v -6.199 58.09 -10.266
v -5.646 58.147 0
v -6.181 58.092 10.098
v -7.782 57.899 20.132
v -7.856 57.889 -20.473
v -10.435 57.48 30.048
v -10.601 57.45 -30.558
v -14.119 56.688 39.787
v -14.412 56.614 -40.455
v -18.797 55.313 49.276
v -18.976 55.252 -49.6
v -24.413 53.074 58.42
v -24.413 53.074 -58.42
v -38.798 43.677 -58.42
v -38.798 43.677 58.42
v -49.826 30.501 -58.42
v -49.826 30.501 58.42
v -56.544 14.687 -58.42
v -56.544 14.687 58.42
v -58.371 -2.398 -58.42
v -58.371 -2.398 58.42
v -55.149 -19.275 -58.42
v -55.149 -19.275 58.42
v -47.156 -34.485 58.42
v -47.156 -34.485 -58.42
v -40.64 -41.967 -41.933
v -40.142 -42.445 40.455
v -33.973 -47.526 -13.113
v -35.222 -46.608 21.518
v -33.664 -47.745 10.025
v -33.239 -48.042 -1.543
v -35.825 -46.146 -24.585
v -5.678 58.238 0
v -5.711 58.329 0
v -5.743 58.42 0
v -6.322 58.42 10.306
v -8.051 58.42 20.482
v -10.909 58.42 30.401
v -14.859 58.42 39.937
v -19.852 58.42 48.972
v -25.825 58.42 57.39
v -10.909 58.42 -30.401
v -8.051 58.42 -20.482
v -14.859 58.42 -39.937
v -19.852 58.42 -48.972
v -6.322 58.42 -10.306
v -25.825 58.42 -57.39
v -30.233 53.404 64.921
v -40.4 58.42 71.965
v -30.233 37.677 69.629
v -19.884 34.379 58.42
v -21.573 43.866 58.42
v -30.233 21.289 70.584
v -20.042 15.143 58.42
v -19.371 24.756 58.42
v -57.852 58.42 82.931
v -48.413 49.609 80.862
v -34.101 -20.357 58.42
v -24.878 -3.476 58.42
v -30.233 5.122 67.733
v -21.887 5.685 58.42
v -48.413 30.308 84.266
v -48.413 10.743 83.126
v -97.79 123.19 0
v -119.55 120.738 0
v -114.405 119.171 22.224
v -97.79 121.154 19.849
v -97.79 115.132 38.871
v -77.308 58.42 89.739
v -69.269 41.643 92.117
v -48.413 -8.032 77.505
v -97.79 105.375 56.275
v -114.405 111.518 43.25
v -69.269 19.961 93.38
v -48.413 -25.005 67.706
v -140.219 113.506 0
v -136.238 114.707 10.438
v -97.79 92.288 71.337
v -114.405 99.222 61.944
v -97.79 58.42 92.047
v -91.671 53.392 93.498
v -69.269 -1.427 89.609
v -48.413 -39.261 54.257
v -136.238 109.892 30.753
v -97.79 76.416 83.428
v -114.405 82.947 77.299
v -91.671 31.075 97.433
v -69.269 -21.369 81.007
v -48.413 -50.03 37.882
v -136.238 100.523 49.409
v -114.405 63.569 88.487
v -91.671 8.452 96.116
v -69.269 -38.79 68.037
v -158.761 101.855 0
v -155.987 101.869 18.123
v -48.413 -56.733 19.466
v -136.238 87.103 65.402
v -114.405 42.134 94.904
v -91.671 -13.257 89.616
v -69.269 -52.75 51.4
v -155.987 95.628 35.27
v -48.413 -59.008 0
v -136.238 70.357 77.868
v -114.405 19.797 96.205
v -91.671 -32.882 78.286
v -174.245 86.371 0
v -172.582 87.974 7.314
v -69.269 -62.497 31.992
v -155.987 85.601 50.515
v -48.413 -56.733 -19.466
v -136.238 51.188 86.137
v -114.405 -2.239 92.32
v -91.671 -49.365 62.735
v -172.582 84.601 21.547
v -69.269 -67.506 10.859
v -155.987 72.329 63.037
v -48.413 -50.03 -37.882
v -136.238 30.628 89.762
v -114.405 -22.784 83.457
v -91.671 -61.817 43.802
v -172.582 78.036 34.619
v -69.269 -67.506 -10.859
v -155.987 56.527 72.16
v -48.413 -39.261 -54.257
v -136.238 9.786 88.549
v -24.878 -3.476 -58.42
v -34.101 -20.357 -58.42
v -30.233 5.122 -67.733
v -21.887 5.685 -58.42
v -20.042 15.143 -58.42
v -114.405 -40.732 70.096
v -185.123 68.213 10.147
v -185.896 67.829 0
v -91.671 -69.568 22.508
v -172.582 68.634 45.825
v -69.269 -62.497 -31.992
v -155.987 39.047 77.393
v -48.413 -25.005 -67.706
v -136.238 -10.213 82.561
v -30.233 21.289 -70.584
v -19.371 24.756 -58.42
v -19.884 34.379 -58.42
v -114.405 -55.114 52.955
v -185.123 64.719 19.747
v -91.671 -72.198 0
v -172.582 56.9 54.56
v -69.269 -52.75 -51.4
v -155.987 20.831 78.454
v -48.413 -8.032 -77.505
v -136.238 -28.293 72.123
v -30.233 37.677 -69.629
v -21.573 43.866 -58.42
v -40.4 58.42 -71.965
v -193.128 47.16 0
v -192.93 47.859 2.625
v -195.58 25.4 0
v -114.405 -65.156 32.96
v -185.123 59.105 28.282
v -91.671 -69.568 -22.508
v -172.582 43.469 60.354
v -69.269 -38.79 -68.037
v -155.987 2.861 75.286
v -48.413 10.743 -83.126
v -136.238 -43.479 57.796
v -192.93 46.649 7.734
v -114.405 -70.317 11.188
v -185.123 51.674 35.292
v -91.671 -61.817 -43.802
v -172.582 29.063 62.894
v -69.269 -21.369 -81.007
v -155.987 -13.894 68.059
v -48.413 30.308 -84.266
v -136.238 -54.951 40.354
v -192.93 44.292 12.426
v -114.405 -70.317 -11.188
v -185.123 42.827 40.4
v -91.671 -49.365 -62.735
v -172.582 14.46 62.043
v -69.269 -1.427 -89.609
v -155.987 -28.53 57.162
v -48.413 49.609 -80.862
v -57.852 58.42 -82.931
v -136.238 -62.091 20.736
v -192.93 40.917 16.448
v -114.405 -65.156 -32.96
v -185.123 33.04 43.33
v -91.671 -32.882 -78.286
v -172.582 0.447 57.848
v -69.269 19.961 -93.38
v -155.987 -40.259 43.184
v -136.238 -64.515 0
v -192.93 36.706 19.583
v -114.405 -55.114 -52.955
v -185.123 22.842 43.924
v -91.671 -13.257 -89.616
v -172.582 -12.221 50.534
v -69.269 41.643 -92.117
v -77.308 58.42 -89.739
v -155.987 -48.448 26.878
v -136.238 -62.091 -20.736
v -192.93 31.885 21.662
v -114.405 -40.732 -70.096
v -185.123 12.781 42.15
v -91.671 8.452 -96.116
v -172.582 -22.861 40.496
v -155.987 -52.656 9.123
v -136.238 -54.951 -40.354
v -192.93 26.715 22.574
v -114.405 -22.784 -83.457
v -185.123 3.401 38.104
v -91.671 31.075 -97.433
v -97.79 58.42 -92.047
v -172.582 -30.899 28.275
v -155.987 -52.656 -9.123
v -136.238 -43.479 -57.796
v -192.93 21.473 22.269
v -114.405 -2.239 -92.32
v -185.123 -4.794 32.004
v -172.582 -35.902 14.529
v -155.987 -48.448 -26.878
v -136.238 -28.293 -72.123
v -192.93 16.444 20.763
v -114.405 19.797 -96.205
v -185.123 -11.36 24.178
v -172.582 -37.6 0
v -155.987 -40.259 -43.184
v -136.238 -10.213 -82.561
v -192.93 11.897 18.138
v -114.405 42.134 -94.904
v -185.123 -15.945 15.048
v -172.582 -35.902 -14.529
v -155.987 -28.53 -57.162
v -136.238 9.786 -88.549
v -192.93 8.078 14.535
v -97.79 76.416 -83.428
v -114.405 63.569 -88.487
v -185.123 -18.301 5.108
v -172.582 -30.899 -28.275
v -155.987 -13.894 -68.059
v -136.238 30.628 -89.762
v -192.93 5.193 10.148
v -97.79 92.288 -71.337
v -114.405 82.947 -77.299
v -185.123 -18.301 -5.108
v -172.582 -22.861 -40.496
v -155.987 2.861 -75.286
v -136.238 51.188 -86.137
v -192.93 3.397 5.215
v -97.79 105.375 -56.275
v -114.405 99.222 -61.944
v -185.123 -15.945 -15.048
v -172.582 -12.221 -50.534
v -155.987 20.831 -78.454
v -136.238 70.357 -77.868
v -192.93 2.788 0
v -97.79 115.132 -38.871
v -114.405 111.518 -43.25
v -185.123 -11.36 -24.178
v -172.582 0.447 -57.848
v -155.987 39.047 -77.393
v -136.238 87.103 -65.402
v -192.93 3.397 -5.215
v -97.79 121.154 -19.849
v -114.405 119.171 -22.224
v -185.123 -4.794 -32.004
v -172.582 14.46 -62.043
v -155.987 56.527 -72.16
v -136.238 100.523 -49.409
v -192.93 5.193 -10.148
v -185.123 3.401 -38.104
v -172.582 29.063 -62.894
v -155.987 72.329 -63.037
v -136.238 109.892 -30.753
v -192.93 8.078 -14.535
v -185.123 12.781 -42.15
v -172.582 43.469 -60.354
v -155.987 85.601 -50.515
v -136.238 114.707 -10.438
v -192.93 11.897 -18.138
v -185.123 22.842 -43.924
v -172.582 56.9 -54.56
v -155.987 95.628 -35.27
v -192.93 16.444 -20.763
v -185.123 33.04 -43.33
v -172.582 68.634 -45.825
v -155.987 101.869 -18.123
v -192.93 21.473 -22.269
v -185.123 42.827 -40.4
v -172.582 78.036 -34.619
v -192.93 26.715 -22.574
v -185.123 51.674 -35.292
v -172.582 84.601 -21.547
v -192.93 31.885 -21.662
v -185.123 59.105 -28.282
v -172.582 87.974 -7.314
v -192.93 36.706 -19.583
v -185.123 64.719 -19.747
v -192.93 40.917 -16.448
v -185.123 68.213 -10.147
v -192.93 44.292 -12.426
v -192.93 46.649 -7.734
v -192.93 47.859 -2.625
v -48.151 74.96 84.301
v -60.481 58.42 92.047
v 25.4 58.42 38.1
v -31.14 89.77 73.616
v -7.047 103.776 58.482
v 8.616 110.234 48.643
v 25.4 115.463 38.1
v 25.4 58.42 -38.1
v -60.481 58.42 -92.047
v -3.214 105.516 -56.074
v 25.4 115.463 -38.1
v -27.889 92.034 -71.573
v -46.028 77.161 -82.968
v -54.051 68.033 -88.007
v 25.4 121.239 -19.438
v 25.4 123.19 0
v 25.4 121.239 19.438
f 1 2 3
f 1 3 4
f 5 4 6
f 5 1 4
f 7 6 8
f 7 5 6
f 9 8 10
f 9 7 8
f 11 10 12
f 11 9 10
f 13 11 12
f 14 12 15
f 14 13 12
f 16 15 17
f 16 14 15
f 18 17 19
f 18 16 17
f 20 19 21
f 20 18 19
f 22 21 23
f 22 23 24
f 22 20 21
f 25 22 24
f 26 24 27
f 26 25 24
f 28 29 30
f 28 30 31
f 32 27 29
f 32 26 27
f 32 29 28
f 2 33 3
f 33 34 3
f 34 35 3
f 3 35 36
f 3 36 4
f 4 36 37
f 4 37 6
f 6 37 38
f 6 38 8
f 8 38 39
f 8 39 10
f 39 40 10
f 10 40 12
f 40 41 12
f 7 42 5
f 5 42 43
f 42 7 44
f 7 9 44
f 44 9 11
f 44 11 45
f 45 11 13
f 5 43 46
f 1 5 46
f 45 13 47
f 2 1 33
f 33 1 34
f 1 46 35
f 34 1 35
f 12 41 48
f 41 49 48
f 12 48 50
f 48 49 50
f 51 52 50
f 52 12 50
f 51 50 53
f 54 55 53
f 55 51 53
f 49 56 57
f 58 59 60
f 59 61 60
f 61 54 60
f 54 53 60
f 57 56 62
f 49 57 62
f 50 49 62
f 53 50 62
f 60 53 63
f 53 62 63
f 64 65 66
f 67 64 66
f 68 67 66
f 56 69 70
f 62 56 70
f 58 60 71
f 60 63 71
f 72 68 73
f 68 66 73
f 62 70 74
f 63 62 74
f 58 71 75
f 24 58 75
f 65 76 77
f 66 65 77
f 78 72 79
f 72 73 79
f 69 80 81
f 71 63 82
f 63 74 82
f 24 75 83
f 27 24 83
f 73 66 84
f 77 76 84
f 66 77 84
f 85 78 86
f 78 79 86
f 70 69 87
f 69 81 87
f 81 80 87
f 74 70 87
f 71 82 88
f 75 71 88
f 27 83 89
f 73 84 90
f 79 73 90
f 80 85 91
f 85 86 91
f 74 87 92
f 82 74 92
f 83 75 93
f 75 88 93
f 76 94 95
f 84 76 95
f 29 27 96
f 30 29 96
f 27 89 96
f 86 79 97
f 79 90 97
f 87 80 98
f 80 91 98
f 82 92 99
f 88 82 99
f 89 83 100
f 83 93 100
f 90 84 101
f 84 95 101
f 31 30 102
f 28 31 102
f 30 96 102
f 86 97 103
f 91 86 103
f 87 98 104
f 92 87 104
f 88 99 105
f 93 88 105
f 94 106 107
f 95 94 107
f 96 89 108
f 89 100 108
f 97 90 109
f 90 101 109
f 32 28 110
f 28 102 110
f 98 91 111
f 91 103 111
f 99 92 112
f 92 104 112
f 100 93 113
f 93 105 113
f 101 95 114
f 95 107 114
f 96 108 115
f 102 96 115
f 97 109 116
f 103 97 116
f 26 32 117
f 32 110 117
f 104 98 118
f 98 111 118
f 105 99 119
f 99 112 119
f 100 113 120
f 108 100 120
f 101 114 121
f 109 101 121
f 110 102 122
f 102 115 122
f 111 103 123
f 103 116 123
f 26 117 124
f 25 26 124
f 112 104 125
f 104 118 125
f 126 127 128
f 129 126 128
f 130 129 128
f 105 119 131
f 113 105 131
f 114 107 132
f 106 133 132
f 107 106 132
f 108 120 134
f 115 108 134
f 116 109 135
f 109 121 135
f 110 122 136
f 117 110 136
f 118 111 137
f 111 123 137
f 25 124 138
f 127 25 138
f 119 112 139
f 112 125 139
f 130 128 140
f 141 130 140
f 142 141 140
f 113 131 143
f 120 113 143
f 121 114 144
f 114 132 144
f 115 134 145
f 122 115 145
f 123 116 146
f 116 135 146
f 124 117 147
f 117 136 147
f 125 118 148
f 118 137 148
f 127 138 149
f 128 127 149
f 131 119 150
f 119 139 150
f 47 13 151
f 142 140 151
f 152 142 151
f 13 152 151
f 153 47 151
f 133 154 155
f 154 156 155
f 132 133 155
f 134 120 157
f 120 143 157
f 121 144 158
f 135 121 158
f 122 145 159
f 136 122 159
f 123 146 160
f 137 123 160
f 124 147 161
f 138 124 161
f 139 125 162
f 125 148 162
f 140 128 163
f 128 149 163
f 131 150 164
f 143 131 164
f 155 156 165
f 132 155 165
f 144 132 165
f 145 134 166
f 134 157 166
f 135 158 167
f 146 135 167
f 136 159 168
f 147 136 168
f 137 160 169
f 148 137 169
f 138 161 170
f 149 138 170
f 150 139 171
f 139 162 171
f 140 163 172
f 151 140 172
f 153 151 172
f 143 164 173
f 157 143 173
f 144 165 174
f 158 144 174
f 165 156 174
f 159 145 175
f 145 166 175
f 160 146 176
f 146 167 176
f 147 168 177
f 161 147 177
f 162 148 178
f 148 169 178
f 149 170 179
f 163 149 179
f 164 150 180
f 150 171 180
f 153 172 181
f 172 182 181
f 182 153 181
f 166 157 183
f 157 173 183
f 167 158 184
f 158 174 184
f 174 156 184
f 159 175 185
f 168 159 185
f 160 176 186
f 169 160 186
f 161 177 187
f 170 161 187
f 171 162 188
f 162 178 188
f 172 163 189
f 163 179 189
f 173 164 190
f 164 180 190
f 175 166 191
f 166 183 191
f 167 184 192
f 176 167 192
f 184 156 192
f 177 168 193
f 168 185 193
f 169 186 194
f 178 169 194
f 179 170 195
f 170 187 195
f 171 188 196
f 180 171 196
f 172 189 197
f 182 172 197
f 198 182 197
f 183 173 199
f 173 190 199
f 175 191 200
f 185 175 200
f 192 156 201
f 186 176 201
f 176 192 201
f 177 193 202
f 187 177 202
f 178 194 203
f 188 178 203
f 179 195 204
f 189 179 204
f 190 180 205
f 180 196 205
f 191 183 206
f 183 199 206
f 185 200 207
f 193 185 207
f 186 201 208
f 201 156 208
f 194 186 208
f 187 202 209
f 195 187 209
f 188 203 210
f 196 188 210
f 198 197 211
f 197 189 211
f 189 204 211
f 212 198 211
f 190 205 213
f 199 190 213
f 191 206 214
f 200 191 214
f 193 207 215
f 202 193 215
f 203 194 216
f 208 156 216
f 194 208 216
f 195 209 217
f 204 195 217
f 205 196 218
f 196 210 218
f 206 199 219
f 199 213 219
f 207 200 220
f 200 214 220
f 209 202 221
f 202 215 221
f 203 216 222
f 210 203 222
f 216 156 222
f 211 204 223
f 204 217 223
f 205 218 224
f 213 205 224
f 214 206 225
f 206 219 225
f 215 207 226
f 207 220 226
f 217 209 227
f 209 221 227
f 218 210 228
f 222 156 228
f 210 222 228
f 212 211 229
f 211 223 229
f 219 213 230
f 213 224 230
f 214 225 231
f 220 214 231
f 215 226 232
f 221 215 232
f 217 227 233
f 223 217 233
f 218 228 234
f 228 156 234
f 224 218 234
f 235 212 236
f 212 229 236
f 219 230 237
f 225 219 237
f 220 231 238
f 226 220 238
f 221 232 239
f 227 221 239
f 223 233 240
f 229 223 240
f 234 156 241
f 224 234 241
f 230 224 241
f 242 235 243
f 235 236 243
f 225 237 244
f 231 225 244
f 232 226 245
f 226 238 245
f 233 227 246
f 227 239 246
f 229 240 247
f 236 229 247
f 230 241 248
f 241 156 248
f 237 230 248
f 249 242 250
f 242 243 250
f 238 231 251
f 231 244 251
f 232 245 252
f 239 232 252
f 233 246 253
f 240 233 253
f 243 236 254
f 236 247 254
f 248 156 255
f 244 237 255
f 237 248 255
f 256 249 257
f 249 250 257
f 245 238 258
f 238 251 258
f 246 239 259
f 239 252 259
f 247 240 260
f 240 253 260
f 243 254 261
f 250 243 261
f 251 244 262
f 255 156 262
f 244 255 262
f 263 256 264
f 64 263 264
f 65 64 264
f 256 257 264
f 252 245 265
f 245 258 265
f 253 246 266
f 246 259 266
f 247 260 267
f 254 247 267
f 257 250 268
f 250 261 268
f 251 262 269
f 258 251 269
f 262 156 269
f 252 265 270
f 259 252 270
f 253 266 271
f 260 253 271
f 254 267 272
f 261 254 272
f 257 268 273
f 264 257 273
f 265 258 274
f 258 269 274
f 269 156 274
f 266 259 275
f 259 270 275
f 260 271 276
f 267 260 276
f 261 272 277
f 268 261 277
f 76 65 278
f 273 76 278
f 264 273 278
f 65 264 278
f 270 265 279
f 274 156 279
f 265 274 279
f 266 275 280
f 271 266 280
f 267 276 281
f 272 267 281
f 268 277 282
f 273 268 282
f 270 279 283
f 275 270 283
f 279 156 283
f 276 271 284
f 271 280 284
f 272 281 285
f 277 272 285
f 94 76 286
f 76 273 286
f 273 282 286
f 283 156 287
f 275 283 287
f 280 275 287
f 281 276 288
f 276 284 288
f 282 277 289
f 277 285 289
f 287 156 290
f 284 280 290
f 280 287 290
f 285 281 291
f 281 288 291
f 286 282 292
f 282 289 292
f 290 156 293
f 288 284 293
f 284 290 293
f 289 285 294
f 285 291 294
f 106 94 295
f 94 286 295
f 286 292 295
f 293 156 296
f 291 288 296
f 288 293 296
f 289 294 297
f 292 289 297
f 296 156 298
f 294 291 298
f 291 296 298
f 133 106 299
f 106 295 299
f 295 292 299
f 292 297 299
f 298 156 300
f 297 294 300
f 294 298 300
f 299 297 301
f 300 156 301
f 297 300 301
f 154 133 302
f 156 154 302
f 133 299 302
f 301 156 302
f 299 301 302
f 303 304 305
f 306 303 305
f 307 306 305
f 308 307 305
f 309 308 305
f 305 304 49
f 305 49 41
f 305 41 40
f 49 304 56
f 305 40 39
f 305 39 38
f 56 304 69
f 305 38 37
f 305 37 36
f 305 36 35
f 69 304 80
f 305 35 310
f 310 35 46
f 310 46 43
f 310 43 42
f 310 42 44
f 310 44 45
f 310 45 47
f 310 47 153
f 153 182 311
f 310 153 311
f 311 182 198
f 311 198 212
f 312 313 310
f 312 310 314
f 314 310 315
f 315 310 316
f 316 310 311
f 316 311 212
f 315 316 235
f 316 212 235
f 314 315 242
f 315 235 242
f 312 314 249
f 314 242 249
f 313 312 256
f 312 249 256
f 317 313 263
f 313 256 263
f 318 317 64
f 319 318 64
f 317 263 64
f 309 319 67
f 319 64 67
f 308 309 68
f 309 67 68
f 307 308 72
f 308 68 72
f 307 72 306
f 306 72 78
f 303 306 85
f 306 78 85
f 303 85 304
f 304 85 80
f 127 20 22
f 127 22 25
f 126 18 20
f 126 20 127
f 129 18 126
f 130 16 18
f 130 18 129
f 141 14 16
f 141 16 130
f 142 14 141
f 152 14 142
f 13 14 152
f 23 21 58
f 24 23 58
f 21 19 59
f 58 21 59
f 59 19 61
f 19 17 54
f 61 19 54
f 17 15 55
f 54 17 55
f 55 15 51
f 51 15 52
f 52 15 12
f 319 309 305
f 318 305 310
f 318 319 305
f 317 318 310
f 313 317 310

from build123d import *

# Parameters (mm, degrees)
BOSS_EXTRUDE2_DEPTH      = 25.4
BOSS_EXTRUDE2_DEPTH_BACK = 97.79
CUT_EXTRUDE1_DEPTH       = 251.97847836
CUT_EXTRUDE2_DEPTH       = 58.42
CUT_EXTRUDE2_DEPTH_BACK  = 58.42
SKETCH4_R                = 58.42


with BuildPart() as part:
    # Sketch1 → Revolve1 (revolve)
    with BuildSketch(Plane.XY):
        with BuildLine():
            Line((-195.58, 25.4), (0, 25.4))
            ThreePointArc((0, 25.4), (-97.79, 123.19), (-195.58, 25.4))
        make_face()
    revolve(axis=Axis((-195.58, 25.4, 0), (1, 0, 0)))

    # Sketch2 → Boss-Extrude2 (add, two sides: drawn at the far end of the back side and taken through both)
    with BuildSketch(Plane(origin=(0, 0, 0), x_dir=(0, 0, -1), z_dir=(1, 0, 0)).offset(-BOSS_EXTRUDE2_DEPTH_BACK)):
        with BuildLine():
            Line((-92.046530081, 58.42), (92.046530081, 58.42))
            ThreePointArc((92.046530081, 58.42), (0, 123.19), (-92.046530081, 58.42))
        make_face()
    extrude(amount=BOSS_EXTRUDE2_DEPTH + BOSS_EXTRUDE2_DEPTH_BACK)

    # Sketch3 → Cut-Extrude1 (cut, through all)
    with BuildSketch(Plane(origin=(0, 0, 0), x_dir=(1, 0, 0), z_dir=(0, 1, 0))):
        Polygon((25.4, -38.1), (25.4, 38.1), (-97.79, 115.482462919), (50.8, 115.482462919), (50.8, -115.482462919), (-97.79, -115.482462919), align=None)
    extrude(amount=CUT_EXTRUDE1_DEPTH, mode=Mode.SUBTRACT)

    # Sketch4 → Cut-Extrude2 (cut, two sides: drawn at the far end of the back side and taken through both)
    with BuildSketch(Plane.XY.offset(-CUT_EXTRUDE2_DEPTH_BACK)):
        Circle(SKETCH4_R)
    extrude(amount=CUT_EXTRUDE2_DEPTH + CUT_EXTRUDE2_DEPTH_BACK, mode=Mode.SUBTRACT)


solid = part.part
